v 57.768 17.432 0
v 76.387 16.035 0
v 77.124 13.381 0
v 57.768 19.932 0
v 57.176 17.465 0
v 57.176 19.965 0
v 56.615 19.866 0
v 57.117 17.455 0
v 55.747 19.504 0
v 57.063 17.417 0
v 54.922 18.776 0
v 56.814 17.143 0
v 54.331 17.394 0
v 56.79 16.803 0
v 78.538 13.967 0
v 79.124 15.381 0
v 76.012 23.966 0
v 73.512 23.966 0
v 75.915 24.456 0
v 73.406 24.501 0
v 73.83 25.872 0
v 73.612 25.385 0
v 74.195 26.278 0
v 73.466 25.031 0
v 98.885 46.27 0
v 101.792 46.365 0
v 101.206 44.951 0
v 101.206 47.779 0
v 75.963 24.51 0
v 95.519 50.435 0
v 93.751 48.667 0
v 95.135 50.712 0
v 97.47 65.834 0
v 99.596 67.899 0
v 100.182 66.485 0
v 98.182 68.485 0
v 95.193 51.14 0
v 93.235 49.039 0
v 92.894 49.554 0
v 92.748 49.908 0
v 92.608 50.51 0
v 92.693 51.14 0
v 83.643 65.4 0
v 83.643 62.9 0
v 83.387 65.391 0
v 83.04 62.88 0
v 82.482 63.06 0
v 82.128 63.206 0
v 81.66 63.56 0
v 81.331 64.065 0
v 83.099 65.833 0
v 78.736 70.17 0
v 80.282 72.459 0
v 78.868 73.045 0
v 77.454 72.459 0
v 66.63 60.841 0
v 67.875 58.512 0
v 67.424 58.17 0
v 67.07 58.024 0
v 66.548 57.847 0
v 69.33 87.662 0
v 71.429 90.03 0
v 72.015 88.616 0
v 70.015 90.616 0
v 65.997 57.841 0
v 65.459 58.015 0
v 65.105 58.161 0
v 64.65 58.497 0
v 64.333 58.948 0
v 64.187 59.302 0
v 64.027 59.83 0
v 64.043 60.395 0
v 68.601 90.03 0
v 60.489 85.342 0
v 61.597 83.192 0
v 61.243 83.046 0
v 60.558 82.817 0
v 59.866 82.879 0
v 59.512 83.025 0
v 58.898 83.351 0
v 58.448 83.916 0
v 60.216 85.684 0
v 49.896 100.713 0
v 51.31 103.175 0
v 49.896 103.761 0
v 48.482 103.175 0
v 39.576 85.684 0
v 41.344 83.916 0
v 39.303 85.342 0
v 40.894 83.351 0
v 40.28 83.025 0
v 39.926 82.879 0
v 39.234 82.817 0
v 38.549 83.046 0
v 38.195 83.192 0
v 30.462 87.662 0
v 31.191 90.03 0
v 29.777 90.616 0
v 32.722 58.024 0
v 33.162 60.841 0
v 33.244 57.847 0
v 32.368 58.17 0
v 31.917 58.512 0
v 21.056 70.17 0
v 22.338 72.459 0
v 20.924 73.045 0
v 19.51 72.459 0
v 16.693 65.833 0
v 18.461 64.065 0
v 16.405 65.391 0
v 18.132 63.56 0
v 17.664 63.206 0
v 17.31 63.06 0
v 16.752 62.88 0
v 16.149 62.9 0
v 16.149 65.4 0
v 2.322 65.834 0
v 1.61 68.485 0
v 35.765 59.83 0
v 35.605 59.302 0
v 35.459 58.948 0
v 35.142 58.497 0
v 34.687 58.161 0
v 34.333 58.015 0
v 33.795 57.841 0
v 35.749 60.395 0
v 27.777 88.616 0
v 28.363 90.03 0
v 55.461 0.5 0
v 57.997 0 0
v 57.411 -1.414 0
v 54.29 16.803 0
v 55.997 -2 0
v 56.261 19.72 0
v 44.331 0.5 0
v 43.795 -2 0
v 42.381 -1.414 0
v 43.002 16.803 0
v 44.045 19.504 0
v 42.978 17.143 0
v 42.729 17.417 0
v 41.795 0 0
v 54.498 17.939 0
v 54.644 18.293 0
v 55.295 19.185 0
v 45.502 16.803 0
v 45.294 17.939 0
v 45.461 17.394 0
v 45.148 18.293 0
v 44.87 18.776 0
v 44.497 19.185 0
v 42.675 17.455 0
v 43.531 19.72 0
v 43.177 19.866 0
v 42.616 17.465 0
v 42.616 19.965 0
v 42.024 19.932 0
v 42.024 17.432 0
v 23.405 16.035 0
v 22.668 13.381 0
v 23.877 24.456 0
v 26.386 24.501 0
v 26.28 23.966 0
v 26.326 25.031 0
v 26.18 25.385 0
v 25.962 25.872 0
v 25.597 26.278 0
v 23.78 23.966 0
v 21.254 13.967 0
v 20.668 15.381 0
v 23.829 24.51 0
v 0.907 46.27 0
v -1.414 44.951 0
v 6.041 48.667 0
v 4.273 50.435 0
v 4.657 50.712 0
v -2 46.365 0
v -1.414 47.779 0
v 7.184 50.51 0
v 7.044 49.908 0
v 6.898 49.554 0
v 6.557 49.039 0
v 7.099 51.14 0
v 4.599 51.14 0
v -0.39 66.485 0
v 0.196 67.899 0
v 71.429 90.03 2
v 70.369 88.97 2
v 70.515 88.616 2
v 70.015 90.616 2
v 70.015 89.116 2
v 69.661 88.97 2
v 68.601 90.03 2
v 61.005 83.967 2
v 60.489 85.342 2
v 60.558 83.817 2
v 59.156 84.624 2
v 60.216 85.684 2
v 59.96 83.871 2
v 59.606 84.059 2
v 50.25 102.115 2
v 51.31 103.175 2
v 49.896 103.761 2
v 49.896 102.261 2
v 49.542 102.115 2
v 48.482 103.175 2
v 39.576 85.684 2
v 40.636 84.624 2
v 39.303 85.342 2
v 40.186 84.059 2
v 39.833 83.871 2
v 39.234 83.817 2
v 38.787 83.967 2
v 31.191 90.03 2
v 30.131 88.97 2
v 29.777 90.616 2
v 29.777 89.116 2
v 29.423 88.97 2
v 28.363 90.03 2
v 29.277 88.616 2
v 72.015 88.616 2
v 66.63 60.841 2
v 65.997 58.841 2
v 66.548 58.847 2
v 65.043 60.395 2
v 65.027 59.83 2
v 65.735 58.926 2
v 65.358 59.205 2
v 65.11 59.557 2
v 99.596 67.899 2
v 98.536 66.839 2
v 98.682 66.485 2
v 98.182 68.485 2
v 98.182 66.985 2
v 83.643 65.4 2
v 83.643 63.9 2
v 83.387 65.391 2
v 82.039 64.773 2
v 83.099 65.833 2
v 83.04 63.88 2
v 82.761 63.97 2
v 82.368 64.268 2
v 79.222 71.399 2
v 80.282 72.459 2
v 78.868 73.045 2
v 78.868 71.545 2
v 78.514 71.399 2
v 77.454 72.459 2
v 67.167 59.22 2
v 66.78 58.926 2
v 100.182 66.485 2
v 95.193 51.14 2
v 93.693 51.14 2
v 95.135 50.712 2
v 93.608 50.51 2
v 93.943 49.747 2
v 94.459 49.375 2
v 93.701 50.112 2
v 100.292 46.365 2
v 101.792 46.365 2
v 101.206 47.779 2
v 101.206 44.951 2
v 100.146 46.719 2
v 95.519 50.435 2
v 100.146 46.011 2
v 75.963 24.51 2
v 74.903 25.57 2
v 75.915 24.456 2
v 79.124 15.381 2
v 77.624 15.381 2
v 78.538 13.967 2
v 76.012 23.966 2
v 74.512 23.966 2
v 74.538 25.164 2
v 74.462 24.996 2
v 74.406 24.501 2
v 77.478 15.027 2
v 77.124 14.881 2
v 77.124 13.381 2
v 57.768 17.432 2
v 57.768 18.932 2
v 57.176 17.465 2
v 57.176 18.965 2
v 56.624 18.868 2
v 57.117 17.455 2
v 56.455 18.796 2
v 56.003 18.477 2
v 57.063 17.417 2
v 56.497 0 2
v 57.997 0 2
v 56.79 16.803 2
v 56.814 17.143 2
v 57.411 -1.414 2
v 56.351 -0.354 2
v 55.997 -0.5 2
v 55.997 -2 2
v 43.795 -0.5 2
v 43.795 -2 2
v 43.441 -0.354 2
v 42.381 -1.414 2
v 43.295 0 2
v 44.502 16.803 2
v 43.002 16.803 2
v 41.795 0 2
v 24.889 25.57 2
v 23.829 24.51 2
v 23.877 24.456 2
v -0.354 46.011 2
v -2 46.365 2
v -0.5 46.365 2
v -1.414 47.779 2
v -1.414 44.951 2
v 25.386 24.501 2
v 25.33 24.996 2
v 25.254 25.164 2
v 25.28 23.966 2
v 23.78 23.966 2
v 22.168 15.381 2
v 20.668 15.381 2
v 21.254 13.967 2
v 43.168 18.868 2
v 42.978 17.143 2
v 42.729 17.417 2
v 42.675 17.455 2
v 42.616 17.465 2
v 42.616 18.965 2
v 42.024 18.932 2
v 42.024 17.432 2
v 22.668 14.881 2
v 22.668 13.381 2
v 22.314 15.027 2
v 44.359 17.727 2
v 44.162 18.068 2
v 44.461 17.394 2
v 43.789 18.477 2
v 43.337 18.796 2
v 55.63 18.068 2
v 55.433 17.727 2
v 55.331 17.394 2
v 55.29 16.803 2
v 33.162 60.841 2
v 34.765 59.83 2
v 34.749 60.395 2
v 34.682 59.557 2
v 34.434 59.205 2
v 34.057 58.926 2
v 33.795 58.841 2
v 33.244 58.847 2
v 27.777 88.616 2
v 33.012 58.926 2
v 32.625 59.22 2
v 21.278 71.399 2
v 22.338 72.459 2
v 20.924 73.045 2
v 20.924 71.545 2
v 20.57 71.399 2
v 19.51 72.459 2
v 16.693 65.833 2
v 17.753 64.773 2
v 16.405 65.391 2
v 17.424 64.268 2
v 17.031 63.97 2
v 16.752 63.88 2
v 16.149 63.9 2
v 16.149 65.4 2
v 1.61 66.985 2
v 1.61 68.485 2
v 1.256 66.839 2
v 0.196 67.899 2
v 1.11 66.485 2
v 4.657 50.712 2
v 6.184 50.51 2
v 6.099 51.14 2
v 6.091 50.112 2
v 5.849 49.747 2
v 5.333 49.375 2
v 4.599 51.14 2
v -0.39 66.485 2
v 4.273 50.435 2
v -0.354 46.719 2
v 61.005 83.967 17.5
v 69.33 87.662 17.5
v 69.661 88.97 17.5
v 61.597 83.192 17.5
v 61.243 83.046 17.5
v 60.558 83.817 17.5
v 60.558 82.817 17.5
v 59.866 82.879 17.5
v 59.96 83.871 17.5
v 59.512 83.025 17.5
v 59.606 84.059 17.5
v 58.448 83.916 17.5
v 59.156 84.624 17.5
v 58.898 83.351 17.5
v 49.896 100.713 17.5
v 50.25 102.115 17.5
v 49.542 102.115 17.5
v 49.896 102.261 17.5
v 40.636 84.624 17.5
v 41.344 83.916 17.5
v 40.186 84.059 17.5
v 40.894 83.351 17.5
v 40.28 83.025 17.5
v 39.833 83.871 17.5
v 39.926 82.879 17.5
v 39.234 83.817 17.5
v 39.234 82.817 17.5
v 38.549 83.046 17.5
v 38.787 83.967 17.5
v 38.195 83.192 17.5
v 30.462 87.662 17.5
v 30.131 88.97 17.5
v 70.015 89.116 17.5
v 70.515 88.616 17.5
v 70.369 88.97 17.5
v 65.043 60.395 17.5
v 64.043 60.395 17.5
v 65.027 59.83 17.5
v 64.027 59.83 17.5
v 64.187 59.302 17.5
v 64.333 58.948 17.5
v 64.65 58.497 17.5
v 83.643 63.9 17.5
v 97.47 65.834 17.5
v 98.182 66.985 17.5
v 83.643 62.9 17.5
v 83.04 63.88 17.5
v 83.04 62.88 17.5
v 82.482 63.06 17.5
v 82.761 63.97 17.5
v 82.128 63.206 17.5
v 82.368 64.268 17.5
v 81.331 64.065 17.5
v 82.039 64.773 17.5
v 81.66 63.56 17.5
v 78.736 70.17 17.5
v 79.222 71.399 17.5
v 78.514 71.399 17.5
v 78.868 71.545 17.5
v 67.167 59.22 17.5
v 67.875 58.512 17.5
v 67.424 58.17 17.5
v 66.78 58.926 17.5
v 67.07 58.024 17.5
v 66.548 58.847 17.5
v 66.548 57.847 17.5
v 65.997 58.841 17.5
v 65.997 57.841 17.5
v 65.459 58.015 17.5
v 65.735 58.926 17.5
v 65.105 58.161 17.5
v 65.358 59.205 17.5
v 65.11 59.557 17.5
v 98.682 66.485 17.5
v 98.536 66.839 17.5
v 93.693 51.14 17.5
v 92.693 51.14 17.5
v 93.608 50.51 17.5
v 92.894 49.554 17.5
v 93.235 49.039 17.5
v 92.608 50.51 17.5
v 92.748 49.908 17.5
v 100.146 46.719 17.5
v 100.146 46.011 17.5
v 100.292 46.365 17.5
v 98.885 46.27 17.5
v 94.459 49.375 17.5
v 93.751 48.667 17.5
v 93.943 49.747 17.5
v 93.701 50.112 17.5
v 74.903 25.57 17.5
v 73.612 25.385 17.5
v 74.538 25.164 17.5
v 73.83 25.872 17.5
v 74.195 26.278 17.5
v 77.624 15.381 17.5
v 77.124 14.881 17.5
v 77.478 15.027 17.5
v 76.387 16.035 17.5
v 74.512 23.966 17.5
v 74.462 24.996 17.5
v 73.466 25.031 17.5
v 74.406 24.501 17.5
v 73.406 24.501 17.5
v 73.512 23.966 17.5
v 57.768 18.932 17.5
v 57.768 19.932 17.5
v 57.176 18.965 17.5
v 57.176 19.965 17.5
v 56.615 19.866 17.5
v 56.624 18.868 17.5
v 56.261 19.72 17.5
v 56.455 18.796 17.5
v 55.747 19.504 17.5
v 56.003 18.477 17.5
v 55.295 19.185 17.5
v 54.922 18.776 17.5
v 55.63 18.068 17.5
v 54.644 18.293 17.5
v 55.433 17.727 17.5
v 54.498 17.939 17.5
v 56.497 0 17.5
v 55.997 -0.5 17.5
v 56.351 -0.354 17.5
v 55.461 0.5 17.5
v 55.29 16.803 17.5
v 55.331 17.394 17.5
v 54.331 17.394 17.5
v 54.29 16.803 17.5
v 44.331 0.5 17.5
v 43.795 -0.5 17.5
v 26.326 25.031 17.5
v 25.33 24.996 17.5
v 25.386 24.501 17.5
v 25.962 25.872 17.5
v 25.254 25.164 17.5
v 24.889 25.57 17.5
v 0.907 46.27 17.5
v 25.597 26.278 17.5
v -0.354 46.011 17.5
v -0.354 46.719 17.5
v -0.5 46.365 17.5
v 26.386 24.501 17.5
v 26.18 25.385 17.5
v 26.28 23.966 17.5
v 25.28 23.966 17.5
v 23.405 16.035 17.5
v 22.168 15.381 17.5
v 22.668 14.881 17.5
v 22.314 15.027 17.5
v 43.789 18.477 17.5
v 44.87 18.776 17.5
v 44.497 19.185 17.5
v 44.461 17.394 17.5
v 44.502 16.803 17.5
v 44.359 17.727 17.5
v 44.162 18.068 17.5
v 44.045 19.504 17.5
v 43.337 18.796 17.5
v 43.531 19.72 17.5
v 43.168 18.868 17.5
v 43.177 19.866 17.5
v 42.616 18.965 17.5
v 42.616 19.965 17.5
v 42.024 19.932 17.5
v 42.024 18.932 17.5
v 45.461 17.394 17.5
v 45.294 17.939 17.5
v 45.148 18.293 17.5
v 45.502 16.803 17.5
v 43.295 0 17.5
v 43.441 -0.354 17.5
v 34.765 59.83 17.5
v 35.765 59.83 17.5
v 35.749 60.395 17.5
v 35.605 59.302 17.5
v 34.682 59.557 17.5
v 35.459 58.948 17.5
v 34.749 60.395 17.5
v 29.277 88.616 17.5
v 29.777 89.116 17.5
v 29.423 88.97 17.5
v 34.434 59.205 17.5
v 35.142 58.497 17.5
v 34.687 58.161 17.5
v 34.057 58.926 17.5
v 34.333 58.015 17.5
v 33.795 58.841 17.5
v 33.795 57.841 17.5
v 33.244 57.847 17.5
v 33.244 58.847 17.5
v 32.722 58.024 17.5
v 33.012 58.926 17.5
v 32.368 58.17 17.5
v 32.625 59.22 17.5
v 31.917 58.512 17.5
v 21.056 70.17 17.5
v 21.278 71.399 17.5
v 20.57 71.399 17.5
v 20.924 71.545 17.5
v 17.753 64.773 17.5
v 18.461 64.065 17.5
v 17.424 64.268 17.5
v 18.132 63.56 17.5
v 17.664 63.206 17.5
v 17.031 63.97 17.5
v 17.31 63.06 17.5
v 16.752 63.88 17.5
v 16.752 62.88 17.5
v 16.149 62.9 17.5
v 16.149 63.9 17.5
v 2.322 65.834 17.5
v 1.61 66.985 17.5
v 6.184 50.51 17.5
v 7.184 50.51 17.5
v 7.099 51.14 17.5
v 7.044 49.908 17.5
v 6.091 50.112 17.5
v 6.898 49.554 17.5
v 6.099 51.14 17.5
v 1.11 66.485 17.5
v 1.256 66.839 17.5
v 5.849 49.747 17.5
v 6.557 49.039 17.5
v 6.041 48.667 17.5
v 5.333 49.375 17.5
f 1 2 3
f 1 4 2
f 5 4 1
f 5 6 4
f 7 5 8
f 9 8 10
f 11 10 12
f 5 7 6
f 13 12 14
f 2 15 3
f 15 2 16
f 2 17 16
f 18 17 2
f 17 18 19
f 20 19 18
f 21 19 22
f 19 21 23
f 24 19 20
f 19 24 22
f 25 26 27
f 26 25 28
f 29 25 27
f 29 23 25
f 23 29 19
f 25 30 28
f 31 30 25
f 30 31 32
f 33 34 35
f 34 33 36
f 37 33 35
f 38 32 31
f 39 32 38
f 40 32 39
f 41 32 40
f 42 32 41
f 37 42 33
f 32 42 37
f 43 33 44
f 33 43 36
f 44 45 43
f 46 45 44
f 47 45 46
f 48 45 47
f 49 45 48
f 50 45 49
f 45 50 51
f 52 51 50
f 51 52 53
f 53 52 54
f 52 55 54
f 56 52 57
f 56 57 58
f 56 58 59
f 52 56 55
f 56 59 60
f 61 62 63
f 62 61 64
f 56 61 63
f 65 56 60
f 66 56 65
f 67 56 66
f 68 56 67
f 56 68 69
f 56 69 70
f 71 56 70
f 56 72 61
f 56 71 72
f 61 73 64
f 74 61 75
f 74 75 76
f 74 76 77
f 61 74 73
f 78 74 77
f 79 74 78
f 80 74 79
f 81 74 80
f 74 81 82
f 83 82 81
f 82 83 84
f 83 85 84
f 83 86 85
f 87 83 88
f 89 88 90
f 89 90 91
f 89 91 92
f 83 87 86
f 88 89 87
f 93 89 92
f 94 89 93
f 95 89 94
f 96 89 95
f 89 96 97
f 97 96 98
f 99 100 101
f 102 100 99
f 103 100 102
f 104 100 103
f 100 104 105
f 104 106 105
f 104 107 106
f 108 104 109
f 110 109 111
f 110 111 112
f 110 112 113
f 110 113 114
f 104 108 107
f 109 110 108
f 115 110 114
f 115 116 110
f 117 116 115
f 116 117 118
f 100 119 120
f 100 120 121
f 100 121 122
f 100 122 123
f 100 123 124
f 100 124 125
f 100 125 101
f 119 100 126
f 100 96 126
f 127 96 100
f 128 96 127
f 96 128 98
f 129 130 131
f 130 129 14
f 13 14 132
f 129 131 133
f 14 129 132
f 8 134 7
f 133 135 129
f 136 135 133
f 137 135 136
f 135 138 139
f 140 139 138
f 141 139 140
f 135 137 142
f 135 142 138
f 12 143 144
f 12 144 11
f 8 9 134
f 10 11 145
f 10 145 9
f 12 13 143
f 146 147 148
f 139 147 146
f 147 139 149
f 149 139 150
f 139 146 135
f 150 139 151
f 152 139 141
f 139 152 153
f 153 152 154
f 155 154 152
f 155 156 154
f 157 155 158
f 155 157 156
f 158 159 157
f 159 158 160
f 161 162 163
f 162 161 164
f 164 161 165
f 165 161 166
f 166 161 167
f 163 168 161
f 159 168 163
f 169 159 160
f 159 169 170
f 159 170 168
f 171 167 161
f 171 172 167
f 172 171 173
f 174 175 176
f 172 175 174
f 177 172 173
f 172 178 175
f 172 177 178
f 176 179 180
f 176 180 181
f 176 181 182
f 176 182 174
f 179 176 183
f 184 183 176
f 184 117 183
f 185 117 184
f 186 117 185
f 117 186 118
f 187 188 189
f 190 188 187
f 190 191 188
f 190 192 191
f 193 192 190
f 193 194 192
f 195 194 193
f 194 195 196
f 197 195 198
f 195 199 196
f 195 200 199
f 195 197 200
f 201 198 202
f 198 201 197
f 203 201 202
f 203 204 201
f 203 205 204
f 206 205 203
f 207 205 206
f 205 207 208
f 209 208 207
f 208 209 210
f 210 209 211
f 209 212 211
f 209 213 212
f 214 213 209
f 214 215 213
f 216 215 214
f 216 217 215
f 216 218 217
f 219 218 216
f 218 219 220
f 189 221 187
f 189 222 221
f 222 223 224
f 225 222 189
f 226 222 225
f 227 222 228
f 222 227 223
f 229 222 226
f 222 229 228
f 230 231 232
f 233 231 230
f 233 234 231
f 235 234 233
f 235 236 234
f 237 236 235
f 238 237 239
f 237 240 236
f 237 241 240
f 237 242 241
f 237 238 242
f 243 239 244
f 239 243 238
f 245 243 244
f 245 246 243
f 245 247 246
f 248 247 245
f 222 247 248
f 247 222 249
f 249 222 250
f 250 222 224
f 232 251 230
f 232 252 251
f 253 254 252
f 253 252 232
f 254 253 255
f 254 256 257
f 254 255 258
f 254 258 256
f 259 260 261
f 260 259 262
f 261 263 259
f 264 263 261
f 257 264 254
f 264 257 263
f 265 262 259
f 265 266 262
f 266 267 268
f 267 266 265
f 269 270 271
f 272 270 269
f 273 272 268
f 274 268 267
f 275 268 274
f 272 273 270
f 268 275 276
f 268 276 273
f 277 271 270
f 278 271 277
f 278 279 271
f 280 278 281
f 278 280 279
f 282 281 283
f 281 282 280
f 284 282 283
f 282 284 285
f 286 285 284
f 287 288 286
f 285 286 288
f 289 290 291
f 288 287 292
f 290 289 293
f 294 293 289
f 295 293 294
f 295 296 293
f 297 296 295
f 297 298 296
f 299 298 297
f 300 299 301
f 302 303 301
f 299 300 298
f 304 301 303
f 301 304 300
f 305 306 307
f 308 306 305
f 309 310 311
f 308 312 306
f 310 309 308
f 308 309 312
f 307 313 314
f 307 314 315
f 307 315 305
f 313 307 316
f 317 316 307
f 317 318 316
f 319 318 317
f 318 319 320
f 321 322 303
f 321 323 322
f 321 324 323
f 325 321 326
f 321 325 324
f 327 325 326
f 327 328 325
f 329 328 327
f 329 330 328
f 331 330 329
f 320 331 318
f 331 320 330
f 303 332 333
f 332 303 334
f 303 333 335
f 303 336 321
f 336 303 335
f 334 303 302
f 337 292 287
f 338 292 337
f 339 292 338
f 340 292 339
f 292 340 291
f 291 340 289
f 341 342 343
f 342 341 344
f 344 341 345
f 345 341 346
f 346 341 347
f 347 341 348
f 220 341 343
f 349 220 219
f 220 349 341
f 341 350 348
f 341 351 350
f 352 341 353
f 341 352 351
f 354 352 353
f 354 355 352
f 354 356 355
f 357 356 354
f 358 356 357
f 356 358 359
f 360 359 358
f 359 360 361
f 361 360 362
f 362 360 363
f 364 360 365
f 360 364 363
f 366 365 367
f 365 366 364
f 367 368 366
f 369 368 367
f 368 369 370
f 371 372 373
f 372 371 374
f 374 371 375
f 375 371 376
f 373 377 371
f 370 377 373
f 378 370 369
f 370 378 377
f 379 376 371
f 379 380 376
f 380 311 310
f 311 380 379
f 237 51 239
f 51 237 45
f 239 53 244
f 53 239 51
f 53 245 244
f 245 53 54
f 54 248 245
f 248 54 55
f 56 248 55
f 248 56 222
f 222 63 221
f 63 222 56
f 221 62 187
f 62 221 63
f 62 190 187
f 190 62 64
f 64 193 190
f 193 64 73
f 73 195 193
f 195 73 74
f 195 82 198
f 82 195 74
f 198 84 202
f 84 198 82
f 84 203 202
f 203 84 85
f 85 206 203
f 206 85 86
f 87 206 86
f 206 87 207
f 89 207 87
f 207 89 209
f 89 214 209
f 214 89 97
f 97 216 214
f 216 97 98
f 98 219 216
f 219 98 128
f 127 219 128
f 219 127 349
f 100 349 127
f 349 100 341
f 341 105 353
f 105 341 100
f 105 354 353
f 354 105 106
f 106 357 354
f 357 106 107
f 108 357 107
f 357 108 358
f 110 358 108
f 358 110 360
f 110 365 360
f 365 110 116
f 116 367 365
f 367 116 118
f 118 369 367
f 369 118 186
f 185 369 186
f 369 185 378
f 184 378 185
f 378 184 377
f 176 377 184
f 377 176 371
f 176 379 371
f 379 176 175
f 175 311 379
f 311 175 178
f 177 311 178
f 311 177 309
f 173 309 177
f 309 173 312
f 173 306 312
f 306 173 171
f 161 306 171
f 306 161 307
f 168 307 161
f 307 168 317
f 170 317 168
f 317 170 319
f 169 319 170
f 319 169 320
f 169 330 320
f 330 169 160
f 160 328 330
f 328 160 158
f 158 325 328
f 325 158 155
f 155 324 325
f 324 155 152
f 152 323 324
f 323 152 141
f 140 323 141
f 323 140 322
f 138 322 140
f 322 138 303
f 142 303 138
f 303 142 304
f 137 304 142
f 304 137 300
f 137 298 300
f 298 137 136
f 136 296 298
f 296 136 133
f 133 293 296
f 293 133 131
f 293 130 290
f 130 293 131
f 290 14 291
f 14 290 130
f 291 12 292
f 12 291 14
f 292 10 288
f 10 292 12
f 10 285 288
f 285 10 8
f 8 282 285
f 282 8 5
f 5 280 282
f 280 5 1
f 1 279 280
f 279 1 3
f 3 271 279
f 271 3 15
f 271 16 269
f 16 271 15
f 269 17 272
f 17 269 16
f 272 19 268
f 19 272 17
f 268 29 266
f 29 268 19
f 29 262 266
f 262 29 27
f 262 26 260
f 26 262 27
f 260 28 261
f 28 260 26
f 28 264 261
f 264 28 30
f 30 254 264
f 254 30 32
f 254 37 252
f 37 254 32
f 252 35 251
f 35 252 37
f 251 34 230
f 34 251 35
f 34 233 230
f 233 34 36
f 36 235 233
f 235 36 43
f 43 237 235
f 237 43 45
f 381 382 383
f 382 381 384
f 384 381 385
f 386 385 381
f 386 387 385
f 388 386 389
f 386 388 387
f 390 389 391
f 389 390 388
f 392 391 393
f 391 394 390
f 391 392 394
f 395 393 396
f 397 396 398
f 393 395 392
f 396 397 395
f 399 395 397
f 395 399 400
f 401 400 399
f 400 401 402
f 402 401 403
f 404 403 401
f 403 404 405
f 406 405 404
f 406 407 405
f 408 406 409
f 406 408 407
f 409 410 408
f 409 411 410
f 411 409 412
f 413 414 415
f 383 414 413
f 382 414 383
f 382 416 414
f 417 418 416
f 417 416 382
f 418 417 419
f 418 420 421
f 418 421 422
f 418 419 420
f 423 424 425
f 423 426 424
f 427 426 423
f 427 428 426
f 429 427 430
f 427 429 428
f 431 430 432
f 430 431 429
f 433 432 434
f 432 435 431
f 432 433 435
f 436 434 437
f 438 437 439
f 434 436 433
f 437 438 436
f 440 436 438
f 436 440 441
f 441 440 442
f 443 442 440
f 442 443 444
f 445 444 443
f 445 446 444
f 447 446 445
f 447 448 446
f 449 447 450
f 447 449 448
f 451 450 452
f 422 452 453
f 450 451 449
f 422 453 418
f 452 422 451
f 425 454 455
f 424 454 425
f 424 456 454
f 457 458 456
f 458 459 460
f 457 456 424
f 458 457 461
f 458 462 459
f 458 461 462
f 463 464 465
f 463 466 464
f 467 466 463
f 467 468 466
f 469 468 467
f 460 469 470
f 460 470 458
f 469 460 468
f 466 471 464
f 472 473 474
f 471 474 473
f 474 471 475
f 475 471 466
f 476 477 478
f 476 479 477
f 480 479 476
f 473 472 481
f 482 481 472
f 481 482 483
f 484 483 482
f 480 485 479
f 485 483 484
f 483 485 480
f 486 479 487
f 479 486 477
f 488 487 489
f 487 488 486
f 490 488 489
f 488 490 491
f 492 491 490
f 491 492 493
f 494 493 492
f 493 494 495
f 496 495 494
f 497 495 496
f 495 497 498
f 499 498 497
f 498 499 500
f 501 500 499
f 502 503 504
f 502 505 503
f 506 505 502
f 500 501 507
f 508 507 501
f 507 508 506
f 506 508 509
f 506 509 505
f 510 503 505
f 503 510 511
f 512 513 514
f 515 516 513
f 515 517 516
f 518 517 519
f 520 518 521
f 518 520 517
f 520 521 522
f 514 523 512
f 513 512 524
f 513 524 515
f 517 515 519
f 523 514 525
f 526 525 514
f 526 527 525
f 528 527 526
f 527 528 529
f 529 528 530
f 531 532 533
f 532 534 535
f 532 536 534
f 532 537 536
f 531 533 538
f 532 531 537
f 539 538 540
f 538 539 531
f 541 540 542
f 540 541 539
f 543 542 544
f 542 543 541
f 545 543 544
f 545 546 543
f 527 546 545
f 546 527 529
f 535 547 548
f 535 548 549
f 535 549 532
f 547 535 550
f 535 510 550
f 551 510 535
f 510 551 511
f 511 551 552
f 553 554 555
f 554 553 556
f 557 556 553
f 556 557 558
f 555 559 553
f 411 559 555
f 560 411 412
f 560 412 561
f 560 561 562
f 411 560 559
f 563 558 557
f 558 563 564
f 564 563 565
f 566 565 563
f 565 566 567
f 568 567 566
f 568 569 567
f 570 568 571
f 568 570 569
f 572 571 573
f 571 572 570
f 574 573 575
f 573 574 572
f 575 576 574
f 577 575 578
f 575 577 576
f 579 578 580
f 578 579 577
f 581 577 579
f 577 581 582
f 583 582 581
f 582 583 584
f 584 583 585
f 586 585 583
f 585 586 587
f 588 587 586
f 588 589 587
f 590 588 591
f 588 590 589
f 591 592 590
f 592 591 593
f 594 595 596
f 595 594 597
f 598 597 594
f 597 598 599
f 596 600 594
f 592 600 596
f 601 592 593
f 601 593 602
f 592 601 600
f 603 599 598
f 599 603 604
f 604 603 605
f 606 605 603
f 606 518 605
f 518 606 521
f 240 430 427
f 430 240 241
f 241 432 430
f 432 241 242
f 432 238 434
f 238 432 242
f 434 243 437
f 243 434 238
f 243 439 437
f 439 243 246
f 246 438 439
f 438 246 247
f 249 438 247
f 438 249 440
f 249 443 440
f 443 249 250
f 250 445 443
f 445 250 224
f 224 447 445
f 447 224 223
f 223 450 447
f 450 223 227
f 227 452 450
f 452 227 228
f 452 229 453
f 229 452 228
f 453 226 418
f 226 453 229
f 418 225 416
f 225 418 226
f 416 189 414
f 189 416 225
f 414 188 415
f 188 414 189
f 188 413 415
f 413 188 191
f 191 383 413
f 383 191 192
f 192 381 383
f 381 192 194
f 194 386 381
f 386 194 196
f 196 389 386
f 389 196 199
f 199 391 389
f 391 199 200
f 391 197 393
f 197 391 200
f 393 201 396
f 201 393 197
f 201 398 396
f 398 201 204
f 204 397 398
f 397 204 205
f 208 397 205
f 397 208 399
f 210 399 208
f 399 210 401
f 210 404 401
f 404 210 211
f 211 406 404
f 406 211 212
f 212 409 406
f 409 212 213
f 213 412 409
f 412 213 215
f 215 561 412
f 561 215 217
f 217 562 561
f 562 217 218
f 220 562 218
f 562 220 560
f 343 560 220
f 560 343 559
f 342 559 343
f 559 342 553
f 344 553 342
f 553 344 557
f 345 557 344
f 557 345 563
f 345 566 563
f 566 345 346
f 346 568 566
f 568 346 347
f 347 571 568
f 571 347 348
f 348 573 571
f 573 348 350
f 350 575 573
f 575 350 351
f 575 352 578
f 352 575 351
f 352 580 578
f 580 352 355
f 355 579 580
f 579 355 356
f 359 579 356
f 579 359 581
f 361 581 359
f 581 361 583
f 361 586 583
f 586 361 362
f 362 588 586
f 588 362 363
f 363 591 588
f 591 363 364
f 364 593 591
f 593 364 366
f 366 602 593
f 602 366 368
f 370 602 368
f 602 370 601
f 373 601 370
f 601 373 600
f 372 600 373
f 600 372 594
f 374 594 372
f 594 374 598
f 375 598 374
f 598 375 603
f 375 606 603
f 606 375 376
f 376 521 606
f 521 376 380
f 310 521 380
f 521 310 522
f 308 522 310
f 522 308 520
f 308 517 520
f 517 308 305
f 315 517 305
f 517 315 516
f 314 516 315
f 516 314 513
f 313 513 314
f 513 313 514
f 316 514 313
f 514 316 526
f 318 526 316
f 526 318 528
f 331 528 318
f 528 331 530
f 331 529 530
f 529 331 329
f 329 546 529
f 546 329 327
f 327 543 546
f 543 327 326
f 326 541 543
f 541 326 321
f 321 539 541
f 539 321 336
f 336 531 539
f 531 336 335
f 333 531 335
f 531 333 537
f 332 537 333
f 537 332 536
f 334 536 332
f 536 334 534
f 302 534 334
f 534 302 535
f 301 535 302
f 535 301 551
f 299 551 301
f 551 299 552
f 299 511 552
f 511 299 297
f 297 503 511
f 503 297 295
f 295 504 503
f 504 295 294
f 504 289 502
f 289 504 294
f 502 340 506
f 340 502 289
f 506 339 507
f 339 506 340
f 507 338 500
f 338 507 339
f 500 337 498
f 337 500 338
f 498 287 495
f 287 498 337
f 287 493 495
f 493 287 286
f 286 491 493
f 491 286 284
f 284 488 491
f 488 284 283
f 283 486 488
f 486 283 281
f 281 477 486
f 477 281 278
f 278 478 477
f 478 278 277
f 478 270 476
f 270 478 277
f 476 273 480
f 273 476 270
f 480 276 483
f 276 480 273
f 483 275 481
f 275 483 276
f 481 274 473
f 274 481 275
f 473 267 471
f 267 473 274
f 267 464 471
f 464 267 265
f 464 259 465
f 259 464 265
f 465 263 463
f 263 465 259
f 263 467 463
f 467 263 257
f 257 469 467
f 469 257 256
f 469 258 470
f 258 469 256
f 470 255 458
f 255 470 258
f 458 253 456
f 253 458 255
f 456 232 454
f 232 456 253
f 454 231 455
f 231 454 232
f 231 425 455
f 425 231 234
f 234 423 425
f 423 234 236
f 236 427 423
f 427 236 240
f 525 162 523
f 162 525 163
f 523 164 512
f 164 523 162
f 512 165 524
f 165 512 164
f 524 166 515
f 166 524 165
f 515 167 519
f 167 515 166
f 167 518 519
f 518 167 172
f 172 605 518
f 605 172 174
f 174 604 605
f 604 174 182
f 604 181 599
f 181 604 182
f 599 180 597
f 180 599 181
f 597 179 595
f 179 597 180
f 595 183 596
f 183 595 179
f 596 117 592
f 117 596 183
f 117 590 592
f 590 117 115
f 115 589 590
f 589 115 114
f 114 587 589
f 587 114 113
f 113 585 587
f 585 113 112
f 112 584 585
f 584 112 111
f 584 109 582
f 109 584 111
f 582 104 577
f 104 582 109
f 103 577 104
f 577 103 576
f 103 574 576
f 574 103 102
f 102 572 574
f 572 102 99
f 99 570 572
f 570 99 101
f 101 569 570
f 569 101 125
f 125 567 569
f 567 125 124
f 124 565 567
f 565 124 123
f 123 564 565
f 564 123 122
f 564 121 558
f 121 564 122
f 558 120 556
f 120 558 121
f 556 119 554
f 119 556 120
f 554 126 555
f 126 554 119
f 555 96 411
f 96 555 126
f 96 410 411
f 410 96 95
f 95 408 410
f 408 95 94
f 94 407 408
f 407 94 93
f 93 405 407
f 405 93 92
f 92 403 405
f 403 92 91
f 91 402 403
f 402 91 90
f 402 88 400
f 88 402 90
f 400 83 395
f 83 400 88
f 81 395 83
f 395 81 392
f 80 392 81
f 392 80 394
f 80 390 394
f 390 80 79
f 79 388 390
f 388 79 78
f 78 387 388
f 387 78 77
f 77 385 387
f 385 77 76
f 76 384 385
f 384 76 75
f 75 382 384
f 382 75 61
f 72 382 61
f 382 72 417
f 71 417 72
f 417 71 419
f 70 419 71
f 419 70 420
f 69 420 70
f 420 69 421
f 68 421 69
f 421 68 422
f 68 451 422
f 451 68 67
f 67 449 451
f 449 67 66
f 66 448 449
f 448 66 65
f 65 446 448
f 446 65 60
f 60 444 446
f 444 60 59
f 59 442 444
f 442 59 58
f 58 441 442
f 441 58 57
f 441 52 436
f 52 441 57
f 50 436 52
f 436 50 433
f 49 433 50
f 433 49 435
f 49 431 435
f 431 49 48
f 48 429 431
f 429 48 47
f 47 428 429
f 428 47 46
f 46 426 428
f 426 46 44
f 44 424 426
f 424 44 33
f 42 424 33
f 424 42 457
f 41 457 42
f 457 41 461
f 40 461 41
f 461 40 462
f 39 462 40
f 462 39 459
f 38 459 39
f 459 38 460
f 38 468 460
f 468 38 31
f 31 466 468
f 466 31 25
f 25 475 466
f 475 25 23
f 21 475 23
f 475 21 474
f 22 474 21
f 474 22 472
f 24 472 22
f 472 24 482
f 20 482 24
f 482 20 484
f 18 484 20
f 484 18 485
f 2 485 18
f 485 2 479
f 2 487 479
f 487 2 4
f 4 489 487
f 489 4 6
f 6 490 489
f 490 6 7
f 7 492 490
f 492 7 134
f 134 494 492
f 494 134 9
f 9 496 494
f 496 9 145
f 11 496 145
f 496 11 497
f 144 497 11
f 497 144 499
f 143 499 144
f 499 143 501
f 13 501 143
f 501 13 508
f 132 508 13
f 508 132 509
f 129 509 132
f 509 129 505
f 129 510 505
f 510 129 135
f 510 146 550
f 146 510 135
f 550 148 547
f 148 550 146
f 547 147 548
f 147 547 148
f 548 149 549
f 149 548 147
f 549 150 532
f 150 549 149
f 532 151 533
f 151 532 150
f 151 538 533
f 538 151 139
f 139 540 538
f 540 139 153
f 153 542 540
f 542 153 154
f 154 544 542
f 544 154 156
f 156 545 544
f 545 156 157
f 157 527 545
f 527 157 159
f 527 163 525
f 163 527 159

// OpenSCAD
// OpenSCAD file automatically generated by svg2cookiercutter.py
wallHeight = 17.5;
wallFlareWidth = 4;
wallFlareThickness = 2;
minWallWidth = 1;
maxWallWidth = 3;
insideWallFlareWidth = 2;
insideWallFlareThickness = 1.5;
minInsideWallWidth = 1;
maxInsideWallWidth = 3;
featureHeight = 8;
minFeatureThickness = 0.8;
maxFeatureThickness = 3;
connectorThickness = 1;
size = 101.760;

module dummy() {}

scale = size/101.760;

module ribbon(points, thickness=1, closed=false) {
    p = closed ? concat(points, [points[0]]) : points;
    
    union() {
        for (i=[1:len(p)-1]) {
            hull() {
                translate(p[i-1]) circle(d=thickness, $fn=8);
                translate(p[i]) circle(d=thickness, $fn=8);
            }
        }
    }
}

module cookieCutter() {

path0=scale*[[-59.358,1.655],[-58.151,18.458],[-58.192,19.049],[-58.359,19.594],[-58.637,20.077],[-59.010,20.486],[-59.462,20.805],[-59.976,21.021],[-60.537,21.120],[-61.129,21.087],[-80.485,17.036],[-77.373,25.621],[-77.267,26.156],[-77.327,26.686],[-77.545,27.173],[-77.910,27.579],[-103.153,48.020],[-97.466,50.676],[-96.950,51.048],[-96.609,51.563],[-96.469,52.165],[-96.554,52.795],[-101.543,68.140],[-87.004,65.055],[-86.401,65.035],[-85.843,65.215],[-85.375,65.569],[-85.046,66.074],[-82.229,72.700],[-70.882,60.521],[-70.431,60.179],[-69.909,60.002],[-69.358,59.996],[-68.820,60.170],[-68.365,60.506],[-68.048,60.957],[-67.888,61.485],[-67.904,62.050],[-73.376,90.271],[-64.604,85.201],[-63.919,84.972],[-63.227,85.034],[-62.613,85.360],[-62.163,85.925],[-53.257,103.416],[-44.351,85.925],[-43.901,85.360],[-43.287,85.034],[-42.595,84.972],[-41.910,85.201],[-33.138,90.271],[-38.610,62.050],[-38.626,61.485],[-38.466,60.957],[-38.149,60.506],[-37.694,60.170],[-37.156,59.996],[-36.605,60.002],[-36.083,60.179],[-35.632,60.521],[-24.285,72.700],[-21.468,66.074],[-21.139,65.569],[-20.671,65.215],[-20.113,65.035],[-19.510,65.055],[-4.971,68.140],[-9.960,52.795],[-10.045,52.165],[-9.905,51.563],[-9.564,51.048],[-9.048,50.676],[-3.361,48.020],[-28.604,27.579],[-28.969,27.173],[-29.187,26.686],[-29.247,26.156],[-29.141,25.621],[-26.029,17.036],[-45.385,21.087],[-45.977,21.120],[-46.538,21.021],[-47.052,20.805],[-47.504,20.486],[-47.877,20.077],[-48.155,19.594],[-48.322,19.049],[-48.363,18.458],[-47.156,1.655],[-59.358,1.655]];
render(convexity=10) linear_extrude(height=(wallHeight)) ribbon(path0,thickness=min(maxWallWidth,max(0.027,minWallWidth)));
difference() {
 render(convexity=10) linear_extrude(height=wallFlareThickness) ribbon(path0,thickness=wallFlareWidth);
 translate([0,0,-0.01]) linear_extrude(height=wallFlareThickness+0.02) polygon(points=path0);
}
}

translate([103.153*scale,-1.655*scale,0]) cookieCutter();
